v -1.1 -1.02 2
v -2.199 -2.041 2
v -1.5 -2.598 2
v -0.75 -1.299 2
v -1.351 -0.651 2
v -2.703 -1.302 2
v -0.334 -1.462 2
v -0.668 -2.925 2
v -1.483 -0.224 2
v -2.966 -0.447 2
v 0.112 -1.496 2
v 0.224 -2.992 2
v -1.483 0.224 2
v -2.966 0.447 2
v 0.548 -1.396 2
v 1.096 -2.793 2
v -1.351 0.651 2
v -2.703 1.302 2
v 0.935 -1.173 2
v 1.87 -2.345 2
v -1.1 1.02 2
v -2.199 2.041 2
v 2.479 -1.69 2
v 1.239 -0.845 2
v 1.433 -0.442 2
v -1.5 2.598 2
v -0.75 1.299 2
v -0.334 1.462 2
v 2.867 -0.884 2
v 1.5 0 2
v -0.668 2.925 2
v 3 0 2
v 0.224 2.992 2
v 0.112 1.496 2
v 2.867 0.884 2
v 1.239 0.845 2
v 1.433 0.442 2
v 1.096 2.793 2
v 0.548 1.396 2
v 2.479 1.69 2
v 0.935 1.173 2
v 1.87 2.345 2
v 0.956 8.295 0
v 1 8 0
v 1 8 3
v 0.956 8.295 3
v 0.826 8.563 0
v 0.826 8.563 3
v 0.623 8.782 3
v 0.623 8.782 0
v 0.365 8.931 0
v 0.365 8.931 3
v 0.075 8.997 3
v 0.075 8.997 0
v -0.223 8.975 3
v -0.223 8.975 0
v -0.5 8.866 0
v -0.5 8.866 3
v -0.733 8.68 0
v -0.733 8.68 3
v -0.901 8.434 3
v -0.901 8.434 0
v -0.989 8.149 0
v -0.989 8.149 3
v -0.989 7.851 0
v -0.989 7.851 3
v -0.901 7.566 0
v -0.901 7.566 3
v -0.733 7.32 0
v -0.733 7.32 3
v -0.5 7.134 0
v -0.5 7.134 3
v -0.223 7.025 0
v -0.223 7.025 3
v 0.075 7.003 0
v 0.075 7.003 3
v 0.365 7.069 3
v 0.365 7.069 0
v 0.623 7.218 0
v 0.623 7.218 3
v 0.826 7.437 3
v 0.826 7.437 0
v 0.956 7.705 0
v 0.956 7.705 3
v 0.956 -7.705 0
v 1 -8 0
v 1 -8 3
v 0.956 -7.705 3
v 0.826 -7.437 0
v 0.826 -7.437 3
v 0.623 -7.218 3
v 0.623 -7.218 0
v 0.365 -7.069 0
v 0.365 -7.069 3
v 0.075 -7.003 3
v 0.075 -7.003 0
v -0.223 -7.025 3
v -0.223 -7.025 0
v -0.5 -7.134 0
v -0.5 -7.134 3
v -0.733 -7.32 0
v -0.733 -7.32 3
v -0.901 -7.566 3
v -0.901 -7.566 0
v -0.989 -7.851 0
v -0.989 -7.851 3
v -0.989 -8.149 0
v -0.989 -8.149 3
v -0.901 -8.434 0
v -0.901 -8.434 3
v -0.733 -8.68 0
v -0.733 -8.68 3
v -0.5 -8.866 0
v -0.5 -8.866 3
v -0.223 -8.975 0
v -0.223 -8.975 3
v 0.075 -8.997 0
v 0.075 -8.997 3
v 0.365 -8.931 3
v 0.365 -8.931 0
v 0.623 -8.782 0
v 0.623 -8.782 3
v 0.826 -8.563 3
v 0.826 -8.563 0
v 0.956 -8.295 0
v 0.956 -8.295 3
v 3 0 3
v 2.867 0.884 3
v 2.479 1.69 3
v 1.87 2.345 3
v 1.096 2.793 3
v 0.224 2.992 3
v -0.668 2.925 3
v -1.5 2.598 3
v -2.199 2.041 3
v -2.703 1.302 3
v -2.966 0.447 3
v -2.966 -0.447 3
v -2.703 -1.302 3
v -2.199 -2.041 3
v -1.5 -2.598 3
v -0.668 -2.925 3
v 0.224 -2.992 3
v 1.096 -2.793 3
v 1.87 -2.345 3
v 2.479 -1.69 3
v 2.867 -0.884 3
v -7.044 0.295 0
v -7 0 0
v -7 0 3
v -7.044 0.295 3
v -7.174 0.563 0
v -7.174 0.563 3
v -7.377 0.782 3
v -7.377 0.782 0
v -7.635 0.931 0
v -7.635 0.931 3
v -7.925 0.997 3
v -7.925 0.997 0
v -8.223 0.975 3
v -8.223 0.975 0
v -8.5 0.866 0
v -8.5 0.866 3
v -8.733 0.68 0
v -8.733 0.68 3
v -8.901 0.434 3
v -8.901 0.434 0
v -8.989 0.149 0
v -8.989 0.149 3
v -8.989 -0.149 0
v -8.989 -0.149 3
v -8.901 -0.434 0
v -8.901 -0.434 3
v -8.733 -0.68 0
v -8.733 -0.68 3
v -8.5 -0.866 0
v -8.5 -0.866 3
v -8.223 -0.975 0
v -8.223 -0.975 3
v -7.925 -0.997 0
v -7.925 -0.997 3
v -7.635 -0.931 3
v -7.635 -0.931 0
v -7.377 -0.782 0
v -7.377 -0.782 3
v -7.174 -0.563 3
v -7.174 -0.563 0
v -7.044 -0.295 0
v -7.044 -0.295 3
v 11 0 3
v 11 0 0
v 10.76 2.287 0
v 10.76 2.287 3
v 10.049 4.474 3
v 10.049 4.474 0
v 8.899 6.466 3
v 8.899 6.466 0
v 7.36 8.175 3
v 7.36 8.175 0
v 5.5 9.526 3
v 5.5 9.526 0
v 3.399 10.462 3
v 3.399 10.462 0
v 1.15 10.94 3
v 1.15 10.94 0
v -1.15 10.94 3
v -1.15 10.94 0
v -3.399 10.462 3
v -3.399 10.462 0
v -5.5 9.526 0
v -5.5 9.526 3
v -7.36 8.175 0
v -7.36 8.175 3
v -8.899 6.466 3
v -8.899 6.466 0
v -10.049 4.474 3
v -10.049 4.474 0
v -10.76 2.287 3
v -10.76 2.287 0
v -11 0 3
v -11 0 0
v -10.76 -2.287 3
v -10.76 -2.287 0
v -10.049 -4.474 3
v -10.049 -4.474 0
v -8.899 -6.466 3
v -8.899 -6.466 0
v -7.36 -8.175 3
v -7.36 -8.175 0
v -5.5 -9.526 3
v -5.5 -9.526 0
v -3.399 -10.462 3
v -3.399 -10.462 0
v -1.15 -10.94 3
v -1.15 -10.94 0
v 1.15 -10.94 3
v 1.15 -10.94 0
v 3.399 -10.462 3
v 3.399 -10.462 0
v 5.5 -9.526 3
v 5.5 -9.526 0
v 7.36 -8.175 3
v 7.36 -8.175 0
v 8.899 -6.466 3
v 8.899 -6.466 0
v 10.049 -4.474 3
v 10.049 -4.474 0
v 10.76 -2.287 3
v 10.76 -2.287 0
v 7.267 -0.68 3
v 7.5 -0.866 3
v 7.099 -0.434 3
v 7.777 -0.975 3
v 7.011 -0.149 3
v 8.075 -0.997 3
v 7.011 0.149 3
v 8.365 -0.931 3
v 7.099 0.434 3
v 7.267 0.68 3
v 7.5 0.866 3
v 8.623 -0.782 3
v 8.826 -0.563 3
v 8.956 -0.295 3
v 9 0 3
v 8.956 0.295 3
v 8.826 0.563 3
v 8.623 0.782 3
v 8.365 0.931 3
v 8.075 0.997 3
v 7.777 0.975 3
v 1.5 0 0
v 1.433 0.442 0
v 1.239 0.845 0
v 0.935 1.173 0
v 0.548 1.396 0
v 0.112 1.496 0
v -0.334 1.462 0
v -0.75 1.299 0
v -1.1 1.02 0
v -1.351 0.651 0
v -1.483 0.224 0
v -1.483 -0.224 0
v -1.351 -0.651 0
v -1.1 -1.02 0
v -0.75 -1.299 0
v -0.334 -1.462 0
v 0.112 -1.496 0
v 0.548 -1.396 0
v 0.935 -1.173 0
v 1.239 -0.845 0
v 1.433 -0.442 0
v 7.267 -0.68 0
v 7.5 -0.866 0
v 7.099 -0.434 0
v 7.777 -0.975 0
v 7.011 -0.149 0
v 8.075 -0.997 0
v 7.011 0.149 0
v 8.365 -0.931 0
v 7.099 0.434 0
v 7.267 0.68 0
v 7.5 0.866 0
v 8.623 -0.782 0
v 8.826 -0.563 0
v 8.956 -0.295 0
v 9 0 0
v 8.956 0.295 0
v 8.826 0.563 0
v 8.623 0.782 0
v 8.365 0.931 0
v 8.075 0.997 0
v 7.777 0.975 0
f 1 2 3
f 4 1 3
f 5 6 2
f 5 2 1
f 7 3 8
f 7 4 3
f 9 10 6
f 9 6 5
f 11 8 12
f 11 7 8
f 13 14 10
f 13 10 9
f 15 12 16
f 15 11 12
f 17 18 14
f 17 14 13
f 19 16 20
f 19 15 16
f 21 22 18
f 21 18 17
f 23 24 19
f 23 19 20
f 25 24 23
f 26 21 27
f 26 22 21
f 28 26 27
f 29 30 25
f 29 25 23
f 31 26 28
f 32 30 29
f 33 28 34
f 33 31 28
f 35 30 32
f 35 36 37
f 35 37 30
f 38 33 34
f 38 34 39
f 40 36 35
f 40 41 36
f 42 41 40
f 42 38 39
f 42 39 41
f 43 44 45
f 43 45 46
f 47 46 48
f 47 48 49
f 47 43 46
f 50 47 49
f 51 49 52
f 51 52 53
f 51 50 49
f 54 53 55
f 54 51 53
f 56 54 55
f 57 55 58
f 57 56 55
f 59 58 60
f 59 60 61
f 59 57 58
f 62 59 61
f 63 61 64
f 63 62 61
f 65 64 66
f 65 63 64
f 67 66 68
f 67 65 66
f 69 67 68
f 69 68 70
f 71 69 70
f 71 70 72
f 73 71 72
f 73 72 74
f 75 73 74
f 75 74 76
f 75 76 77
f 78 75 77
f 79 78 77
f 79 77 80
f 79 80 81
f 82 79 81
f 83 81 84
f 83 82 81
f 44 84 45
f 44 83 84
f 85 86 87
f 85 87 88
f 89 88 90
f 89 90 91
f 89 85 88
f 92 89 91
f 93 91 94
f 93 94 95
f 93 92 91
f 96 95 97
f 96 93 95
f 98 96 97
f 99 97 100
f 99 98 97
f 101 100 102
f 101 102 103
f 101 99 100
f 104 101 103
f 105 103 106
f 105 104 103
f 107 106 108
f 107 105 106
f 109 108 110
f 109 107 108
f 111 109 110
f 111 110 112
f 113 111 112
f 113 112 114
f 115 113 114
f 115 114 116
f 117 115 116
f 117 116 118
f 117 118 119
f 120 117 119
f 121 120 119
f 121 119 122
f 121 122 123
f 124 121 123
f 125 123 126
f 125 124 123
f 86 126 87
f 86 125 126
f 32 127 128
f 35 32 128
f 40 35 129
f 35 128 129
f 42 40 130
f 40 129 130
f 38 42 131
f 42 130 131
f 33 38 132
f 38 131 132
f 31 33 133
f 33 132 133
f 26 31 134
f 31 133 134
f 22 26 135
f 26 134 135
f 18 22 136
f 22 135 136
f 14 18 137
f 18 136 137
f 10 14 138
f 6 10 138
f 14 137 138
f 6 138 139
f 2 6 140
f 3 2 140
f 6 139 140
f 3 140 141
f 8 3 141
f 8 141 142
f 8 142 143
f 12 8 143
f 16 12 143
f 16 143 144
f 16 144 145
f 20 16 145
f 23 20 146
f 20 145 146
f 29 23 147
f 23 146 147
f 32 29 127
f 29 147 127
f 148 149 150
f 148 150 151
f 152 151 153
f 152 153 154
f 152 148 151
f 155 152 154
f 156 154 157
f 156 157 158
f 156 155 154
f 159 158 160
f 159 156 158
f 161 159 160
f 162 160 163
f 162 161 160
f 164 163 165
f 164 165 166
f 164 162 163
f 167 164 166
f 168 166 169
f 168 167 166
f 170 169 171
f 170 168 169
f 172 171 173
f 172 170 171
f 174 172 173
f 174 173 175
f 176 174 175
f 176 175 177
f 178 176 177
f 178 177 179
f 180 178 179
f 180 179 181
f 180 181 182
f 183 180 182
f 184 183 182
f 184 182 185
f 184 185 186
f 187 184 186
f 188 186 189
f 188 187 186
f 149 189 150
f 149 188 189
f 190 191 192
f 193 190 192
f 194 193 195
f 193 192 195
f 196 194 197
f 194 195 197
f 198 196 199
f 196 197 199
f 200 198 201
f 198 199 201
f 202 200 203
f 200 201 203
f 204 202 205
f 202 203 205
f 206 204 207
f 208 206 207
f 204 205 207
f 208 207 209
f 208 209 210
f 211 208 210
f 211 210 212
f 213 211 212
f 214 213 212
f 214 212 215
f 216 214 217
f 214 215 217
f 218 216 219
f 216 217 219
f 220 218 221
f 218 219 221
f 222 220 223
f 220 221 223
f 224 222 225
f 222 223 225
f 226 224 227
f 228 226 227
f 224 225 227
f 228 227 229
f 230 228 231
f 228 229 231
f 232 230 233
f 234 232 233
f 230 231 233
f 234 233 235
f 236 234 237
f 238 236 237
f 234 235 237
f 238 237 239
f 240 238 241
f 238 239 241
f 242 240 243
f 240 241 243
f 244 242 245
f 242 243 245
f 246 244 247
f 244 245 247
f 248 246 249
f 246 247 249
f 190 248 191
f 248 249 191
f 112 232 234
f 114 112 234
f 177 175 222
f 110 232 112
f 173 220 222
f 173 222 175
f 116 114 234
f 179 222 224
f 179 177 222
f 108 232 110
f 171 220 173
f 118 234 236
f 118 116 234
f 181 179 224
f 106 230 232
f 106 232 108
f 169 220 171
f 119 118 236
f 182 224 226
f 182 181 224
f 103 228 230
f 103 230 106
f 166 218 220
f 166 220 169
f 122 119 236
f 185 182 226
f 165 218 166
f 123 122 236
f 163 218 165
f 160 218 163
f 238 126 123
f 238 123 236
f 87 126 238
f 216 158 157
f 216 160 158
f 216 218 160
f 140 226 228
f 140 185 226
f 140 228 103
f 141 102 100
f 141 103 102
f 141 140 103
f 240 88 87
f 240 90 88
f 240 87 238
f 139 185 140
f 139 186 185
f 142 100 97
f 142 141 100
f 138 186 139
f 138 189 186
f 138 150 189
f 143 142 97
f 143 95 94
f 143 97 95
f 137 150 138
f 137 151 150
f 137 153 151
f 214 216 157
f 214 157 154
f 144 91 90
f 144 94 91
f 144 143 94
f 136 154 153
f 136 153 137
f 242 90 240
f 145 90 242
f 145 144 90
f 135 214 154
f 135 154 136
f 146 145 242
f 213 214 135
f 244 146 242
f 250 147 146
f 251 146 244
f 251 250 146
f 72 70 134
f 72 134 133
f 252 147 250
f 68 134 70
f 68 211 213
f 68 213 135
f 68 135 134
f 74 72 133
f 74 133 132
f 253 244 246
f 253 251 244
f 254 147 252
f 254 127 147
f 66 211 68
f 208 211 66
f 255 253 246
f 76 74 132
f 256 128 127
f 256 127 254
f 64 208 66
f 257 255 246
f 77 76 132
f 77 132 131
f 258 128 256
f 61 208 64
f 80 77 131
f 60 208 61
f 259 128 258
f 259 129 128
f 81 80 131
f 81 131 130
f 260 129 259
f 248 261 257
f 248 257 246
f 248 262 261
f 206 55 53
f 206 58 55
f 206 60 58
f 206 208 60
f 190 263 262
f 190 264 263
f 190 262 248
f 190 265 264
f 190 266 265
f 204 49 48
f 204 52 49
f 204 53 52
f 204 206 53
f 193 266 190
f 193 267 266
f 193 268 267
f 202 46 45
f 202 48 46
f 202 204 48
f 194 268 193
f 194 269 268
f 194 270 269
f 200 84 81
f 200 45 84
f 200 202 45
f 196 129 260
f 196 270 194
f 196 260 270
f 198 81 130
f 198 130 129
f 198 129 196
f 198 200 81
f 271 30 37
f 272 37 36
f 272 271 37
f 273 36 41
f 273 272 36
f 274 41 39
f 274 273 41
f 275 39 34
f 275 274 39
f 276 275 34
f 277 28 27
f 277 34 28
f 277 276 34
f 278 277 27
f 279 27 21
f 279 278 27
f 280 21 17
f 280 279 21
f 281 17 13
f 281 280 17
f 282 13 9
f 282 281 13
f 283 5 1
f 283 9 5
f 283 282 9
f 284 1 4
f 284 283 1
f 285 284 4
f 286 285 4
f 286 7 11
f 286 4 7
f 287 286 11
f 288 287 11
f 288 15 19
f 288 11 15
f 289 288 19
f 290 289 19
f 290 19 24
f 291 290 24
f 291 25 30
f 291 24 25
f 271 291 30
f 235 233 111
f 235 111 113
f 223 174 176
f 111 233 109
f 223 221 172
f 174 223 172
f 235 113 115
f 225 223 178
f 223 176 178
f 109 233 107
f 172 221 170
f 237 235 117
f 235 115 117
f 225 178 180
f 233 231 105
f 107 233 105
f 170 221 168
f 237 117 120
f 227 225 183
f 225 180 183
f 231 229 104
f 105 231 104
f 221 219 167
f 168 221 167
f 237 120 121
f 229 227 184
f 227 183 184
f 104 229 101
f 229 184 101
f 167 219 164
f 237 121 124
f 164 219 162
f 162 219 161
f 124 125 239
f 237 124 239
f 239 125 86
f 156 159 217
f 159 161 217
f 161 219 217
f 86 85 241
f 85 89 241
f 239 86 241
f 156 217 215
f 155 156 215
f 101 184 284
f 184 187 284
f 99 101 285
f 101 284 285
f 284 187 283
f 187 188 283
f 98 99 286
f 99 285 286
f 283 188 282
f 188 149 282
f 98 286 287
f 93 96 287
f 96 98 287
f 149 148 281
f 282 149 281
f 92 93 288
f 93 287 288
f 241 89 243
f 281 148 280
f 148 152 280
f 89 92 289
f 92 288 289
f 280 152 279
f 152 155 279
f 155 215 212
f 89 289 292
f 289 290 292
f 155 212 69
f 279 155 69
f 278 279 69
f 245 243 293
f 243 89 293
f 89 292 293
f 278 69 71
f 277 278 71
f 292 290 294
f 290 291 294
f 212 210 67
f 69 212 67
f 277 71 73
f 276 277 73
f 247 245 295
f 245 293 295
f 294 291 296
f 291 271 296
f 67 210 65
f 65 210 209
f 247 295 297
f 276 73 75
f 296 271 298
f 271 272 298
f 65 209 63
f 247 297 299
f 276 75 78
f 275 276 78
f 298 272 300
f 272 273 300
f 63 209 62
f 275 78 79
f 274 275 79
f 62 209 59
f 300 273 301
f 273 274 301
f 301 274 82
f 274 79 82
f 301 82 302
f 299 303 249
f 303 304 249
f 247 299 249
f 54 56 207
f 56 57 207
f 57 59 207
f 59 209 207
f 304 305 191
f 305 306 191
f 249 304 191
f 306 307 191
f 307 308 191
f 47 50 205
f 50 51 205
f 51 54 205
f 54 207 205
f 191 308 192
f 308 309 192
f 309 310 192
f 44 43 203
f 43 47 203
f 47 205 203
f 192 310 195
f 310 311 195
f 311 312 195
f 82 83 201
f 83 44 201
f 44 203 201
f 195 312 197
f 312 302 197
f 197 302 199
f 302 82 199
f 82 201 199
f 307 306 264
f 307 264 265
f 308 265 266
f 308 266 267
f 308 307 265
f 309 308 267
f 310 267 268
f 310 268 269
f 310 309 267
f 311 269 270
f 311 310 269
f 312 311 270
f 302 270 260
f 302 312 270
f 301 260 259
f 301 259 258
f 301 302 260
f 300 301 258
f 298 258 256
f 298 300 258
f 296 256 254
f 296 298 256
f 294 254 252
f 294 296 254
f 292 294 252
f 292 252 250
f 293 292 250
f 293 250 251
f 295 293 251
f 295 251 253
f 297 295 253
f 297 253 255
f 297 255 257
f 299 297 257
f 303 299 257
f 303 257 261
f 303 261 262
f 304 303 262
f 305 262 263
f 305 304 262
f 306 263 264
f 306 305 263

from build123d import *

# Parameters (mm, degrees)
SZKIC1_R                    = 11
SZKIC1_R_2                  = 1
SZKIC1_R_3                  = 1.5
DODANIE_WYCI_GNI_CIE1_DEPTH = 3
SZKIC2_R                    = 3
WYTNIJ_WYCI_GNI_CIE1_DEPTH  = 1


with BuildPart() as part:
    # Szkic1 → Dodanie-wyciągnięcie1 (new body)
    with BuildSketch(Plane.XY):
        Circle(SZKIC1_R)
        with Locations((0, 8)):
            Circle(SZKIC1_R_2, mode=Mode.SUBTRACT)
        with Locations((8, 0)):
            Circle(SZKIC1_R_2, mode=Mode.SUBTRACT)
        with Locations((0, -8)):
            Circle(SZKIC1_R_2, mode=Mode.SUBTRACT)
        with Locations((-8, 0)):
            Circle(SZKIC1_R_2, mode=Mode.SUBTRACT)
        Circle(SZKIC1_R_3, mode=Mode.SUBTRACT)
    extrude(amount=DODANIE_WYCI_GNI_CIE1_DEPTH)

    # Szkic2 → Wytnij-wyciągnięcie1 (cut)
    with BuildSketch(Plane.XY.offset(3)):
        Circle(SZKIC2_R)
    extrude(amount=-WYTNIJ_WYCI_GNI_CIE1_DEPTH, mode=Mode.SUBTRACT)


solid = part.part
